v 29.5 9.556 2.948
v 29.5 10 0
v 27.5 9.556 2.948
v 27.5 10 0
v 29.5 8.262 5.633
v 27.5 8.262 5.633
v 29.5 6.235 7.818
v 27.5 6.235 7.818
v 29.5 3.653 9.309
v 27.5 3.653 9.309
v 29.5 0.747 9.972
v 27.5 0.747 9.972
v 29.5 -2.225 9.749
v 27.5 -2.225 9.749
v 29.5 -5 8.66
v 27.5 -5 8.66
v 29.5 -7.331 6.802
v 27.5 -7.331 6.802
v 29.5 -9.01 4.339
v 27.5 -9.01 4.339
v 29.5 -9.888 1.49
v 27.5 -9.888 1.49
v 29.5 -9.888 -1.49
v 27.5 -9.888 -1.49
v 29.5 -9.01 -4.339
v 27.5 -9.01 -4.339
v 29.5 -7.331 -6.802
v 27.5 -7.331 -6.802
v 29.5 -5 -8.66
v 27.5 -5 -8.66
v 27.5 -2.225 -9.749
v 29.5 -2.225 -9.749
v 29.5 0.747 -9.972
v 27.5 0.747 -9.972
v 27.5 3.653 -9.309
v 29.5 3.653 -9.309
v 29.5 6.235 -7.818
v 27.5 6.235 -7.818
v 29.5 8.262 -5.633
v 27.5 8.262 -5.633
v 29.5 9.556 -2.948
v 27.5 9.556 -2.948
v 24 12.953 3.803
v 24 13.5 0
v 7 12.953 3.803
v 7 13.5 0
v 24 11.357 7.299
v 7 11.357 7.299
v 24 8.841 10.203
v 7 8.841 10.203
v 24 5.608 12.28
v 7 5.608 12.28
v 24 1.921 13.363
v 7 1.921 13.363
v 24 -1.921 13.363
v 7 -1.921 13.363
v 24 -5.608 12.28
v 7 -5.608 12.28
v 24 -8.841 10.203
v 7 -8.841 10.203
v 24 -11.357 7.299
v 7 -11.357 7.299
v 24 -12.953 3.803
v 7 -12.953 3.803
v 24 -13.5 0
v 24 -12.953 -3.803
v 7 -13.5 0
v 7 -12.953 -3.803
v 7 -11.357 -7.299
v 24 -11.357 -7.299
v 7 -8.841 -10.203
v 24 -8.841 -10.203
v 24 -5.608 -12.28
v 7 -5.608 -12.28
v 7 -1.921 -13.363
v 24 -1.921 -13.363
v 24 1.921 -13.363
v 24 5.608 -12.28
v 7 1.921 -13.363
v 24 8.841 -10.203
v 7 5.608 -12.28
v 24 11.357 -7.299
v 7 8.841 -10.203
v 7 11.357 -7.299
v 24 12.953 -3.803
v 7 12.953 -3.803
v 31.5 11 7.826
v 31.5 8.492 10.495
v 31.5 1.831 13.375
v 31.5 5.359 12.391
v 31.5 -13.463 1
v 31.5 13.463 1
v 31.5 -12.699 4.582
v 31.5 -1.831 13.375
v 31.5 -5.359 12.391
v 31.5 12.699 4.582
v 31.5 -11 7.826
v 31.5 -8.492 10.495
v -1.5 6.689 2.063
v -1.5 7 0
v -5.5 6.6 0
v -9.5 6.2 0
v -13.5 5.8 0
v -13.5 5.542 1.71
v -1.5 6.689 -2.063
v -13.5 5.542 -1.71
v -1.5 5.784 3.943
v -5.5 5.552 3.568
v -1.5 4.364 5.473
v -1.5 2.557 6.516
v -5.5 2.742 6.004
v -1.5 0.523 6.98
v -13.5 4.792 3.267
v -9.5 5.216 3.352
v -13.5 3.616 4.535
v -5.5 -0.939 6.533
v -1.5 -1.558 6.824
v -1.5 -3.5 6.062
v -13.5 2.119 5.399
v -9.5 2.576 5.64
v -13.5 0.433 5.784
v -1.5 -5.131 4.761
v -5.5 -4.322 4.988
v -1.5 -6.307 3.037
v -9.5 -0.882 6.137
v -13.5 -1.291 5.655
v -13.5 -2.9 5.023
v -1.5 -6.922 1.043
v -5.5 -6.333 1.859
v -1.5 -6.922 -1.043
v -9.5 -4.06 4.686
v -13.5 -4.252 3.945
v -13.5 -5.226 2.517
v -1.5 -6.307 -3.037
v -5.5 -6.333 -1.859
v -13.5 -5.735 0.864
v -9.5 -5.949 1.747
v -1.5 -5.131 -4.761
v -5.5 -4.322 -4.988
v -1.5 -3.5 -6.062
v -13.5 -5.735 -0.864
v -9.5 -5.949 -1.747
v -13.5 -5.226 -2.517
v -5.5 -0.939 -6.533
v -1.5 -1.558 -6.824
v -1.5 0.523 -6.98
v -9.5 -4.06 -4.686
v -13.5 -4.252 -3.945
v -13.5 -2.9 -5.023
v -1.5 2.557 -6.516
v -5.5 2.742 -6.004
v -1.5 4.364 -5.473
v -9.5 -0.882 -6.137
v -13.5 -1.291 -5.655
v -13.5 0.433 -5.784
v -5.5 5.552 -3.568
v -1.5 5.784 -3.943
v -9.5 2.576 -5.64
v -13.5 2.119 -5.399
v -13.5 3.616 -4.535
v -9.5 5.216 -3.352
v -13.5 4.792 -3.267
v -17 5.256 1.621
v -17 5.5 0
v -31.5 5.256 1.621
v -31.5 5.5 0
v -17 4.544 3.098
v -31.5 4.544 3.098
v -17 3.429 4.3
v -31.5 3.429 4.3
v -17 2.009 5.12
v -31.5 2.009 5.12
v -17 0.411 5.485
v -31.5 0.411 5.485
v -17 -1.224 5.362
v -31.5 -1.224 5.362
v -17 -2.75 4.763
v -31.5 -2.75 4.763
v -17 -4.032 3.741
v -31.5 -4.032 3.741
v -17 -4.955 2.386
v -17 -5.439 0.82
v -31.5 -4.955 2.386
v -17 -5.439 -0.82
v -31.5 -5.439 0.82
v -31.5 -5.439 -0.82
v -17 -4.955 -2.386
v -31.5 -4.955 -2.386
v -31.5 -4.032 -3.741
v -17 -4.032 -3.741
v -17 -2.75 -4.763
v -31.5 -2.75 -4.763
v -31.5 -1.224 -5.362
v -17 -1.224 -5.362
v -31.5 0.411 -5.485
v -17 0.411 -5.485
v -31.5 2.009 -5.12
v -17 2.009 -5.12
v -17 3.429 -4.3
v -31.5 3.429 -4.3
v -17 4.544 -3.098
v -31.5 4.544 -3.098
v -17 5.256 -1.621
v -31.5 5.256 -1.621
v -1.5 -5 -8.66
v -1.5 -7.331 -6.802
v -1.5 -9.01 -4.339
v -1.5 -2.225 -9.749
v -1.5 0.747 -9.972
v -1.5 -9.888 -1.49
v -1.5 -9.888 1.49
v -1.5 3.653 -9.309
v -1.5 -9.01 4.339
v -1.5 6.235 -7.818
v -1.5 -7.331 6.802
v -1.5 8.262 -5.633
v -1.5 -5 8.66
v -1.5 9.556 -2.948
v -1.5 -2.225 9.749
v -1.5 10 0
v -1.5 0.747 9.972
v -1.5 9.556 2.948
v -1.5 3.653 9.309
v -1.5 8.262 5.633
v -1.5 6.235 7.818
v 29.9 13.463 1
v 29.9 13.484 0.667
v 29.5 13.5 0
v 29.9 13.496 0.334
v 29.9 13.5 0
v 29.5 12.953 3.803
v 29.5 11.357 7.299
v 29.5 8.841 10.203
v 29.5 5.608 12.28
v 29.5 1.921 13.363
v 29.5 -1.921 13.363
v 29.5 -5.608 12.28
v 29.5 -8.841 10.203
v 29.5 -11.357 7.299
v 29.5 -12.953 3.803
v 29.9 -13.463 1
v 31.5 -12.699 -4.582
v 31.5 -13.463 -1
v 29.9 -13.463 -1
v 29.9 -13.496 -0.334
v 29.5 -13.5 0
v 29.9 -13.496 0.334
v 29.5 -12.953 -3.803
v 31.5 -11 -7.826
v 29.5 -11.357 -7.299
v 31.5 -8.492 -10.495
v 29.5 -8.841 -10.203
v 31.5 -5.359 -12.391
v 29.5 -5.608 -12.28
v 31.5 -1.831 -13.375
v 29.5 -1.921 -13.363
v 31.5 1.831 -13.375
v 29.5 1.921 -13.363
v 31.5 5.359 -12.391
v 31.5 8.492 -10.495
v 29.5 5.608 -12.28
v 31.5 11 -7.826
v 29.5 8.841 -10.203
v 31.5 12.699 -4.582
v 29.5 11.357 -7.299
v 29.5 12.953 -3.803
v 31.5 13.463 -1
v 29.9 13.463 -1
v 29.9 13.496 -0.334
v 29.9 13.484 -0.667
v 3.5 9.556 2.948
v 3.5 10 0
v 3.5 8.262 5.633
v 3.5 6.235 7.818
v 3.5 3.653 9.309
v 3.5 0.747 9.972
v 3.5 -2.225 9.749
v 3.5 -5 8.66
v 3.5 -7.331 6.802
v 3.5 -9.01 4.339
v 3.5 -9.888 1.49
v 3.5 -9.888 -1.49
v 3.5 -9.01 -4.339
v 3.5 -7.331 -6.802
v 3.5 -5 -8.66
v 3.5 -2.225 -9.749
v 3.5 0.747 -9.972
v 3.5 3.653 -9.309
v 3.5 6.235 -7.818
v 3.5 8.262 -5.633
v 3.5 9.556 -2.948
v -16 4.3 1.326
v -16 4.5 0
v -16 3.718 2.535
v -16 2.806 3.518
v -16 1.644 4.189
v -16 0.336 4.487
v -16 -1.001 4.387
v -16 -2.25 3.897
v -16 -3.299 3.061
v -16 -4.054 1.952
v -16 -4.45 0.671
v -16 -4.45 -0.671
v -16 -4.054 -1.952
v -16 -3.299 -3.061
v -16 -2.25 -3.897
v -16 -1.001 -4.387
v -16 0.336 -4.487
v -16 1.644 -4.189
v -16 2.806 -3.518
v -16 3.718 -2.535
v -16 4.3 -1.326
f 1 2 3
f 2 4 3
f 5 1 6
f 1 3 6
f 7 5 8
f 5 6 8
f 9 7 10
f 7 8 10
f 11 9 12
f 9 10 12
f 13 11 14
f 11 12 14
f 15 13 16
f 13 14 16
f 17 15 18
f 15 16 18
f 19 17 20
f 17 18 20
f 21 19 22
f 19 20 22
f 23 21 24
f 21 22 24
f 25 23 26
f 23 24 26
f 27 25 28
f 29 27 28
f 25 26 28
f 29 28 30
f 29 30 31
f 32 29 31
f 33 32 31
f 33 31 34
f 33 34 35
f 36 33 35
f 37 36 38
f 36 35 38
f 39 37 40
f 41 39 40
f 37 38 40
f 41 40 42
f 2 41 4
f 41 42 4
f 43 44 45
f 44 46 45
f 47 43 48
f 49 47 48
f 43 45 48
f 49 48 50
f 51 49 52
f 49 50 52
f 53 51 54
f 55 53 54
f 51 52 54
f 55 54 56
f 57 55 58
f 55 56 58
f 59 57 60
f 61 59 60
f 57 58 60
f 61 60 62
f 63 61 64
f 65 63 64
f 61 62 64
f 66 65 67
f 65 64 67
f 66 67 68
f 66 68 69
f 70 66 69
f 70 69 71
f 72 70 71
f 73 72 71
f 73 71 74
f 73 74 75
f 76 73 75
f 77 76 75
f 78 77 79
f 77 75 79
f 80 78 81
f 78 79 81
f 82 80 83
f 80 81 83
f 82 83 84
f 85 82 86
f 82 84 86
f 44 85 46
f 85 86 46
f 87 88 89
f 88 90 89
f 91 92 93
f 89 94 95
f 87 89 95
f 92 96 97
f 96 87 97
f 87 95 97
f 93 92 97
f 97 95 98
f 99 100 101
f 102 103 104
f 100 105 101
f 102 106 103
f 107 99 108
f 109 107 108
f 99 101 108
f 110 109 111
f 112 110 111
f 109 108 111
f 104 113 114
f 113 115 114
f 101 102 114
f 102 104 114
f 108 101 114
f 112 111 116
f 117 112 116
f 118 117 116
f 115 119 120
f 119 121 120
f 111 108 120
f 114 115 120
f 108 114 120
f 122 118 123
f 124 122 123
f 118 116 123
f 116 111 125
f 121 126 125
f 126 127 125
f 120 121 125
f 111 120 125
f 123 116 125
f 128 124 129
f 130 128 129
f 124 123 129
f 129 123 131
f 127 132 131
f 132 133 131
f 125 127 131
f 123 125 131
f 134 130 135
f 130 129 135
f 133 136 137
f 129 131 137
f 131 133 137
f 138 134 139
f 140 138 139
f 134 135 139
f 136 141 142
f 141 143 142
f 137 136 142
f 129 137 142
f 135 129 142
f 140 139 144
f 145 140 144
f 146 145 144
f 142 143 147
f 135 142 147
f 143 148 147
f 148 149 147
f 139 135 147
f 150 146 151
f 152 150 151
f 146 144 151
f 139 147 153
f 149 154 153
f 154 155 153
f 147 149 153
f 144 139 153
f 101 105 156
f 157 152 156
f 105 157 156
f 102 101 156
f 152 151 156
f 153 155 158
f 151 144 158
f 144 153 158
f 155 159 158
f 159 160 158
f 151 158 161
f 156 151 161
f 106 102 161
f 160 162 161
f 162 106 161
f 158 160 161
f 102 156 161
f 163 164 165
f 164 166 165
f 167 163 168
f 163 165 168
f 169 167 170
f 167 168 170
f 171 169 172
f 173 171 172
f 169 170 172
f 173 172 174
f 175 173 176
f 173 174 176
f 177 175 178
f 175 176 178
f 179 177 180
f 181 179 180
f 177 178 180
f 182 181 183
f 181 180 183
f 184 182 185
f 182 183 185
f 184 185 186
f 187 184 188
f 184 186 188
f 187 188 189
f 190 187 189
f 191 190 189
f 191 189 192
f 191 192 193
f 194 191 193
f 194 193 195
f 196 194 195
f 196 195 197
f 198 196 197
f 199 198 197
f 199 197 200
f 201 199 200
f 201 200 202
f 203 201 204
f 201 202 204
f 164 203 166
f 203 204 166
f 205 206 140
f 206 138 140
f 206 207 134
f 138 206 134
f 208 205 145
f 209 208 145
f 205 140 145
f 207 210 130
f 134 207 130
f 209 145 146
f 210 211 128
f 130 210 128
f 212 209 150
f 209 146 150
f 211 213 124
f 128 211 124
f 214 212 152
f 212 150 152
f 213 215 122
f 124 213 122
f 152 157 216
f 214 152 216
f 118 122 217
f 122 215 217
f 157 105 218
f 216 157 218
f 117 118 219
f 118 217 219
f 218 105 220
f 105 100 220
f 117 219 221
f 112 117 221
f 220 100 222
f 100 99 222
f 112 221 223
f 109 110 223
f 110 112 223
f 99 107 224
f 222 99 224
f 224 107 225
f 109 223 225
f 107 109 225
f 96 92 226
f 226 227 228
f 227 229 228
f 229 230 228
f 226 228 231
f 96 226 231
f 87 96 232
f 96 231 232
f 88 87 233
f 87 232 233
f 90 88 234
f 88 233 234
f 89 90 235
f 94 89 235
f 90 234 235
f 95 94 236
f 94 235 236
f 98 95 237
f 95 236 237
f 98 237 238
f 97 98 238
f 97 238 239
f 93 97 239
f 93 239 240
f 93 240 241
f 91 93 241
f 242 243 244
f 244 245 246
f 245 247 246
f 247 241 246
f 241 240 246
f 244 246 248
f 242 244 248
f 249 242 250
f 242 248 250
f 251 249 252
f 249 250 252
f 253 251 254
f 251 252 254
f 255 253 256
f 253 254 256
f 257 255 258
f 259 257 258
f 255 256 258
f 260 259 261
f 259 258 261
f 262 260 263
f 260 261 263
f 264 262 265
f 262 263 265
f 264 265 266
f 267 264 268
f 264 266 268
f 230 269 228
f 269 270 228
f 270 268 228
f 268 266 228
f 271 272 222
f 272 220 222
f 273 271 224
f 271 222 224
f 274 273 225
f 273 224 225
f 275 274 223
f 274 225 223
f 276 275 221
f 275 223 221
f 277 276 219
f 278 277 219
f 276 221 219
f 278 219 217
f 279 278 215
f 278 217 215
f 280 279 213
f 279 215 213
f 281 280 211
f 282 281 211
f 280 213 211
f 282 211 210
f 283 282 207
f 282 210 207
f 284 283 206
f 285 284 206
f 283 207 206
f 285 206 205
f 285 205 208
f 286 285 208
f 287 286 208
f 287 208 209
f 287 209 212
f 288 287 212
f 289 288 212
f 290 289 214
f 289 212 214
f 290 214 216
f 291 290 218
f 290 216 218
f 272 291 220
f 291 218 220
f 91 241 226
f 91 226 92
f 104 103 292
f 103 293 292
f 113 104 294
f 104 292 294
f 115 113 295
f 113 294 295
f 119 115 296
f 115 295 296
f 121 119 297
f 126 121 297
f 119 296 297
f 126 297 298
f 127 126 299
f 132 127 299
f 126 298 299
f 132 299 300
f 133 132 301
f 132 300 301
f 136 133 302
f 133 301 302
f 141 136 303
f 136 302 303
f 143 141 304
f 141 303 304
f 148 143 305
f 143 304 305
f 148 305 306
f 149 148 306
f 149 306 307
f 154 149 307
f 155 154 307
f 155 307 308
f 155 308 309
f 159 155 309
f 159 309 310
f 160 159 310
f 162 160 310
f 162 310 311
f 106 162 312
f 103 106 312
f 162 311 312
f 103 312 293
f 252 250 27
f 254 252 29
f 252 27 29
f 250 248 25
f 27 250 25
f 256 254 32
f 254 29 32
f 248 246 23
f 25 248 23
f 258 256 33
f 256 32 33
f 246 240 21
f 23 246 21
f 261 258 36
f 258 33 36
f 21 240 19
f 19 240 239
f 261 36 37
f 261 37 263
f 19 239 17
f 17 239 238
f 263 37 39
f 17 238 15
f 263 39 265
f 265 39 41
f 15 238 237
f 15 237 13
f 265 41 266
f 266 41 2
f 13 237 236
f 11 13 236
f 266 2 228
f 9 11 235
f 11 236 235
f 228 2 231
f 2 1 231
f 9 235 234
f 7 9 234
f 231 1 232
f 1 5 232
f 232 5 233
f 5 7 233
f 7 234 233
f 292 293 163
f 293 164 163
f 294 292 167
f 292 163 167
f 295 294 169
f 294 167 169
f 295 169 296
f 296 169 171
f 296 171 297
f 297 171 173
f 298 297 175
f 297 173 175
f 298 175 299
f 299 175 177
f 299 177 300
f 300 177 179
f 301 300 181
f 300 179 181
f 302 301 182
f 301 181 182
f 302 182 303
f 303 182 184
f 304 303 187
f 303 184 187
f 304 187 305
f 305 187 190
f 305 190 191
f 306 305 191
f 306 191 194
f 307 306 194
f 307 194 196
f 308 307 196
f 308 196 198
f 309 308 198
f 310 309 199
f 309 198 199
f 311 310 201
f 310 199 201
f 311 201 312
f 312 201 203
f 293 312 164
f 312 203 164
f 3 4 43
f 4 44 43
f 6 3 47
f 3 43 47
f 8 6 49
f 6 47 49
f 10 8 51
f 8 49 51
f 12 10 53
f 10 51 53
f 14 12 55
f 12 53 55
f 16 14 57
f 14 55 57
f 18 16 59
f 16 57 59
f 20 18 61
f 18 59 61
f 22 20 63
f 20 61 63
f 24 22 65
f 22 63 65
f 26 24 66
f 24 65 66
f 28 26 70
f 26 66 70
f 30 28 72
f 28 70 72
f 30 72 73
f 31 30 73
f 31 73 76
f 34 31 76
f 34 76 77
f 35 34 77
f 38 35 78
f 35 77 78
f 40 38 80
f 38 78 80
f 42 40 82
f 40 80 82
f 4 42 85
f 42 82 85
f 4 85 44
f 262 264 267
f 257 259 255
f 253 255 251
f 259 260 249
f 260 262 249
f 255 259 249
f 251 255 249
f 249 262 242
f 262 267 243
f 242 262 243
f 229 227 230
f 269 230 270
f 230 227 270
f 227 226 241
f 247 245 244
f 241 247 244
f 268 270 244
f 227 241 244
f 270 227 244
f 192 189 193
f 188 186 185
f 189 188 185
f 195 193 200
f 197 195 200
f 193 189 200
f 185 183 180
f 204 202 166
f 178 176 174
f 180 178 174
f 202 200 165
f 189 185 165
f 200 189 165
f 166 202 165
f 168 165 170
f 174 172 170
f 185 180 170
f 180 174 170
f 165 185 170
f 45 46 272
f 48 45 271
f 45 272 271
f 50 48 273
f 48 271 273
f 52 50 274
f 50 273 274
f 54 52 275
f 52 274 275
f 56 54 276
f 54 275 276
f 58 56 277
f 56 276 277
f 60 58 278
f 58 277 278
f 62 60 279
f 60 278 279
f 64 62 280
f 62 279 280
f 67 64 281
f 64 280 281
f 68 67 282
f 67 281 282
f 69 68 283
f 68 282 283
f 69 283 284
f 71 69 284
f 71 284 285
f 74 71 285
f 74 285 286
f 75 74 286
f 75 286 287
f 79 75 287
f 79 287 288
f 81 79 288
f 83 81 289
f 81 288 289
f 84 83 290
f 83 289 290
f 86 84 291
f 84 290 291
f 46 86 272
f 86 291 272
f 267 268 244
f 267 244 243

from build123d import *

# Parameters (mm, degrees)
SKETCH_2_W               = 1.6
SKETCH_2_H               = 2
CUT_EXTRUDE_1_DEPTH      = 14.5
CUT_EXTRUDE_1_DEPTH_BACK = 14.5


with BuildPart() as part:
    # Эскиз1 → Повернуть1 (revolve)
    with BuildSketch(Plane.XY):
        Polygon((-31.5, 0), (31.5, 0), (31.5, 13.5), (29.5, 13.5), (29.5, 10), (27.5, 10), (24, 13.5), (7, 13.5), (3.5, 10), (-1.5, 10), (-1.5, 7), (-13.5, 5.8), (-16, 4.5), (-17, 5.5), (-31.5, 5.5), align=None)
    revolve(axis=Axis((-261.918227013, 0, 0), (1, 0, 0)))

    # Эскиз2 → Вырез-Вытянуть1 (cut, two sides)
    with BuildSketch(Plane(origin=(0, 0, 0), x_dir=(1, 0, 0), z_dir=(0, 1, 0))) as cut_extrude_1_sk:
        with Locations((30.7, 0)):
            Rectangle(SKETCH_2_W, SKETCH_2_H)
    extrude(amount=CUT_EXTRUDE_1_DEPTH, mode=Mode.SUBTRACT)
    extrude(cut_extrude_1_sk.sketch, amount=-CUT_EXTRUDE_1_DEPTH_BACK, mode=Mode.SUBTRACT)


solid = part.part
